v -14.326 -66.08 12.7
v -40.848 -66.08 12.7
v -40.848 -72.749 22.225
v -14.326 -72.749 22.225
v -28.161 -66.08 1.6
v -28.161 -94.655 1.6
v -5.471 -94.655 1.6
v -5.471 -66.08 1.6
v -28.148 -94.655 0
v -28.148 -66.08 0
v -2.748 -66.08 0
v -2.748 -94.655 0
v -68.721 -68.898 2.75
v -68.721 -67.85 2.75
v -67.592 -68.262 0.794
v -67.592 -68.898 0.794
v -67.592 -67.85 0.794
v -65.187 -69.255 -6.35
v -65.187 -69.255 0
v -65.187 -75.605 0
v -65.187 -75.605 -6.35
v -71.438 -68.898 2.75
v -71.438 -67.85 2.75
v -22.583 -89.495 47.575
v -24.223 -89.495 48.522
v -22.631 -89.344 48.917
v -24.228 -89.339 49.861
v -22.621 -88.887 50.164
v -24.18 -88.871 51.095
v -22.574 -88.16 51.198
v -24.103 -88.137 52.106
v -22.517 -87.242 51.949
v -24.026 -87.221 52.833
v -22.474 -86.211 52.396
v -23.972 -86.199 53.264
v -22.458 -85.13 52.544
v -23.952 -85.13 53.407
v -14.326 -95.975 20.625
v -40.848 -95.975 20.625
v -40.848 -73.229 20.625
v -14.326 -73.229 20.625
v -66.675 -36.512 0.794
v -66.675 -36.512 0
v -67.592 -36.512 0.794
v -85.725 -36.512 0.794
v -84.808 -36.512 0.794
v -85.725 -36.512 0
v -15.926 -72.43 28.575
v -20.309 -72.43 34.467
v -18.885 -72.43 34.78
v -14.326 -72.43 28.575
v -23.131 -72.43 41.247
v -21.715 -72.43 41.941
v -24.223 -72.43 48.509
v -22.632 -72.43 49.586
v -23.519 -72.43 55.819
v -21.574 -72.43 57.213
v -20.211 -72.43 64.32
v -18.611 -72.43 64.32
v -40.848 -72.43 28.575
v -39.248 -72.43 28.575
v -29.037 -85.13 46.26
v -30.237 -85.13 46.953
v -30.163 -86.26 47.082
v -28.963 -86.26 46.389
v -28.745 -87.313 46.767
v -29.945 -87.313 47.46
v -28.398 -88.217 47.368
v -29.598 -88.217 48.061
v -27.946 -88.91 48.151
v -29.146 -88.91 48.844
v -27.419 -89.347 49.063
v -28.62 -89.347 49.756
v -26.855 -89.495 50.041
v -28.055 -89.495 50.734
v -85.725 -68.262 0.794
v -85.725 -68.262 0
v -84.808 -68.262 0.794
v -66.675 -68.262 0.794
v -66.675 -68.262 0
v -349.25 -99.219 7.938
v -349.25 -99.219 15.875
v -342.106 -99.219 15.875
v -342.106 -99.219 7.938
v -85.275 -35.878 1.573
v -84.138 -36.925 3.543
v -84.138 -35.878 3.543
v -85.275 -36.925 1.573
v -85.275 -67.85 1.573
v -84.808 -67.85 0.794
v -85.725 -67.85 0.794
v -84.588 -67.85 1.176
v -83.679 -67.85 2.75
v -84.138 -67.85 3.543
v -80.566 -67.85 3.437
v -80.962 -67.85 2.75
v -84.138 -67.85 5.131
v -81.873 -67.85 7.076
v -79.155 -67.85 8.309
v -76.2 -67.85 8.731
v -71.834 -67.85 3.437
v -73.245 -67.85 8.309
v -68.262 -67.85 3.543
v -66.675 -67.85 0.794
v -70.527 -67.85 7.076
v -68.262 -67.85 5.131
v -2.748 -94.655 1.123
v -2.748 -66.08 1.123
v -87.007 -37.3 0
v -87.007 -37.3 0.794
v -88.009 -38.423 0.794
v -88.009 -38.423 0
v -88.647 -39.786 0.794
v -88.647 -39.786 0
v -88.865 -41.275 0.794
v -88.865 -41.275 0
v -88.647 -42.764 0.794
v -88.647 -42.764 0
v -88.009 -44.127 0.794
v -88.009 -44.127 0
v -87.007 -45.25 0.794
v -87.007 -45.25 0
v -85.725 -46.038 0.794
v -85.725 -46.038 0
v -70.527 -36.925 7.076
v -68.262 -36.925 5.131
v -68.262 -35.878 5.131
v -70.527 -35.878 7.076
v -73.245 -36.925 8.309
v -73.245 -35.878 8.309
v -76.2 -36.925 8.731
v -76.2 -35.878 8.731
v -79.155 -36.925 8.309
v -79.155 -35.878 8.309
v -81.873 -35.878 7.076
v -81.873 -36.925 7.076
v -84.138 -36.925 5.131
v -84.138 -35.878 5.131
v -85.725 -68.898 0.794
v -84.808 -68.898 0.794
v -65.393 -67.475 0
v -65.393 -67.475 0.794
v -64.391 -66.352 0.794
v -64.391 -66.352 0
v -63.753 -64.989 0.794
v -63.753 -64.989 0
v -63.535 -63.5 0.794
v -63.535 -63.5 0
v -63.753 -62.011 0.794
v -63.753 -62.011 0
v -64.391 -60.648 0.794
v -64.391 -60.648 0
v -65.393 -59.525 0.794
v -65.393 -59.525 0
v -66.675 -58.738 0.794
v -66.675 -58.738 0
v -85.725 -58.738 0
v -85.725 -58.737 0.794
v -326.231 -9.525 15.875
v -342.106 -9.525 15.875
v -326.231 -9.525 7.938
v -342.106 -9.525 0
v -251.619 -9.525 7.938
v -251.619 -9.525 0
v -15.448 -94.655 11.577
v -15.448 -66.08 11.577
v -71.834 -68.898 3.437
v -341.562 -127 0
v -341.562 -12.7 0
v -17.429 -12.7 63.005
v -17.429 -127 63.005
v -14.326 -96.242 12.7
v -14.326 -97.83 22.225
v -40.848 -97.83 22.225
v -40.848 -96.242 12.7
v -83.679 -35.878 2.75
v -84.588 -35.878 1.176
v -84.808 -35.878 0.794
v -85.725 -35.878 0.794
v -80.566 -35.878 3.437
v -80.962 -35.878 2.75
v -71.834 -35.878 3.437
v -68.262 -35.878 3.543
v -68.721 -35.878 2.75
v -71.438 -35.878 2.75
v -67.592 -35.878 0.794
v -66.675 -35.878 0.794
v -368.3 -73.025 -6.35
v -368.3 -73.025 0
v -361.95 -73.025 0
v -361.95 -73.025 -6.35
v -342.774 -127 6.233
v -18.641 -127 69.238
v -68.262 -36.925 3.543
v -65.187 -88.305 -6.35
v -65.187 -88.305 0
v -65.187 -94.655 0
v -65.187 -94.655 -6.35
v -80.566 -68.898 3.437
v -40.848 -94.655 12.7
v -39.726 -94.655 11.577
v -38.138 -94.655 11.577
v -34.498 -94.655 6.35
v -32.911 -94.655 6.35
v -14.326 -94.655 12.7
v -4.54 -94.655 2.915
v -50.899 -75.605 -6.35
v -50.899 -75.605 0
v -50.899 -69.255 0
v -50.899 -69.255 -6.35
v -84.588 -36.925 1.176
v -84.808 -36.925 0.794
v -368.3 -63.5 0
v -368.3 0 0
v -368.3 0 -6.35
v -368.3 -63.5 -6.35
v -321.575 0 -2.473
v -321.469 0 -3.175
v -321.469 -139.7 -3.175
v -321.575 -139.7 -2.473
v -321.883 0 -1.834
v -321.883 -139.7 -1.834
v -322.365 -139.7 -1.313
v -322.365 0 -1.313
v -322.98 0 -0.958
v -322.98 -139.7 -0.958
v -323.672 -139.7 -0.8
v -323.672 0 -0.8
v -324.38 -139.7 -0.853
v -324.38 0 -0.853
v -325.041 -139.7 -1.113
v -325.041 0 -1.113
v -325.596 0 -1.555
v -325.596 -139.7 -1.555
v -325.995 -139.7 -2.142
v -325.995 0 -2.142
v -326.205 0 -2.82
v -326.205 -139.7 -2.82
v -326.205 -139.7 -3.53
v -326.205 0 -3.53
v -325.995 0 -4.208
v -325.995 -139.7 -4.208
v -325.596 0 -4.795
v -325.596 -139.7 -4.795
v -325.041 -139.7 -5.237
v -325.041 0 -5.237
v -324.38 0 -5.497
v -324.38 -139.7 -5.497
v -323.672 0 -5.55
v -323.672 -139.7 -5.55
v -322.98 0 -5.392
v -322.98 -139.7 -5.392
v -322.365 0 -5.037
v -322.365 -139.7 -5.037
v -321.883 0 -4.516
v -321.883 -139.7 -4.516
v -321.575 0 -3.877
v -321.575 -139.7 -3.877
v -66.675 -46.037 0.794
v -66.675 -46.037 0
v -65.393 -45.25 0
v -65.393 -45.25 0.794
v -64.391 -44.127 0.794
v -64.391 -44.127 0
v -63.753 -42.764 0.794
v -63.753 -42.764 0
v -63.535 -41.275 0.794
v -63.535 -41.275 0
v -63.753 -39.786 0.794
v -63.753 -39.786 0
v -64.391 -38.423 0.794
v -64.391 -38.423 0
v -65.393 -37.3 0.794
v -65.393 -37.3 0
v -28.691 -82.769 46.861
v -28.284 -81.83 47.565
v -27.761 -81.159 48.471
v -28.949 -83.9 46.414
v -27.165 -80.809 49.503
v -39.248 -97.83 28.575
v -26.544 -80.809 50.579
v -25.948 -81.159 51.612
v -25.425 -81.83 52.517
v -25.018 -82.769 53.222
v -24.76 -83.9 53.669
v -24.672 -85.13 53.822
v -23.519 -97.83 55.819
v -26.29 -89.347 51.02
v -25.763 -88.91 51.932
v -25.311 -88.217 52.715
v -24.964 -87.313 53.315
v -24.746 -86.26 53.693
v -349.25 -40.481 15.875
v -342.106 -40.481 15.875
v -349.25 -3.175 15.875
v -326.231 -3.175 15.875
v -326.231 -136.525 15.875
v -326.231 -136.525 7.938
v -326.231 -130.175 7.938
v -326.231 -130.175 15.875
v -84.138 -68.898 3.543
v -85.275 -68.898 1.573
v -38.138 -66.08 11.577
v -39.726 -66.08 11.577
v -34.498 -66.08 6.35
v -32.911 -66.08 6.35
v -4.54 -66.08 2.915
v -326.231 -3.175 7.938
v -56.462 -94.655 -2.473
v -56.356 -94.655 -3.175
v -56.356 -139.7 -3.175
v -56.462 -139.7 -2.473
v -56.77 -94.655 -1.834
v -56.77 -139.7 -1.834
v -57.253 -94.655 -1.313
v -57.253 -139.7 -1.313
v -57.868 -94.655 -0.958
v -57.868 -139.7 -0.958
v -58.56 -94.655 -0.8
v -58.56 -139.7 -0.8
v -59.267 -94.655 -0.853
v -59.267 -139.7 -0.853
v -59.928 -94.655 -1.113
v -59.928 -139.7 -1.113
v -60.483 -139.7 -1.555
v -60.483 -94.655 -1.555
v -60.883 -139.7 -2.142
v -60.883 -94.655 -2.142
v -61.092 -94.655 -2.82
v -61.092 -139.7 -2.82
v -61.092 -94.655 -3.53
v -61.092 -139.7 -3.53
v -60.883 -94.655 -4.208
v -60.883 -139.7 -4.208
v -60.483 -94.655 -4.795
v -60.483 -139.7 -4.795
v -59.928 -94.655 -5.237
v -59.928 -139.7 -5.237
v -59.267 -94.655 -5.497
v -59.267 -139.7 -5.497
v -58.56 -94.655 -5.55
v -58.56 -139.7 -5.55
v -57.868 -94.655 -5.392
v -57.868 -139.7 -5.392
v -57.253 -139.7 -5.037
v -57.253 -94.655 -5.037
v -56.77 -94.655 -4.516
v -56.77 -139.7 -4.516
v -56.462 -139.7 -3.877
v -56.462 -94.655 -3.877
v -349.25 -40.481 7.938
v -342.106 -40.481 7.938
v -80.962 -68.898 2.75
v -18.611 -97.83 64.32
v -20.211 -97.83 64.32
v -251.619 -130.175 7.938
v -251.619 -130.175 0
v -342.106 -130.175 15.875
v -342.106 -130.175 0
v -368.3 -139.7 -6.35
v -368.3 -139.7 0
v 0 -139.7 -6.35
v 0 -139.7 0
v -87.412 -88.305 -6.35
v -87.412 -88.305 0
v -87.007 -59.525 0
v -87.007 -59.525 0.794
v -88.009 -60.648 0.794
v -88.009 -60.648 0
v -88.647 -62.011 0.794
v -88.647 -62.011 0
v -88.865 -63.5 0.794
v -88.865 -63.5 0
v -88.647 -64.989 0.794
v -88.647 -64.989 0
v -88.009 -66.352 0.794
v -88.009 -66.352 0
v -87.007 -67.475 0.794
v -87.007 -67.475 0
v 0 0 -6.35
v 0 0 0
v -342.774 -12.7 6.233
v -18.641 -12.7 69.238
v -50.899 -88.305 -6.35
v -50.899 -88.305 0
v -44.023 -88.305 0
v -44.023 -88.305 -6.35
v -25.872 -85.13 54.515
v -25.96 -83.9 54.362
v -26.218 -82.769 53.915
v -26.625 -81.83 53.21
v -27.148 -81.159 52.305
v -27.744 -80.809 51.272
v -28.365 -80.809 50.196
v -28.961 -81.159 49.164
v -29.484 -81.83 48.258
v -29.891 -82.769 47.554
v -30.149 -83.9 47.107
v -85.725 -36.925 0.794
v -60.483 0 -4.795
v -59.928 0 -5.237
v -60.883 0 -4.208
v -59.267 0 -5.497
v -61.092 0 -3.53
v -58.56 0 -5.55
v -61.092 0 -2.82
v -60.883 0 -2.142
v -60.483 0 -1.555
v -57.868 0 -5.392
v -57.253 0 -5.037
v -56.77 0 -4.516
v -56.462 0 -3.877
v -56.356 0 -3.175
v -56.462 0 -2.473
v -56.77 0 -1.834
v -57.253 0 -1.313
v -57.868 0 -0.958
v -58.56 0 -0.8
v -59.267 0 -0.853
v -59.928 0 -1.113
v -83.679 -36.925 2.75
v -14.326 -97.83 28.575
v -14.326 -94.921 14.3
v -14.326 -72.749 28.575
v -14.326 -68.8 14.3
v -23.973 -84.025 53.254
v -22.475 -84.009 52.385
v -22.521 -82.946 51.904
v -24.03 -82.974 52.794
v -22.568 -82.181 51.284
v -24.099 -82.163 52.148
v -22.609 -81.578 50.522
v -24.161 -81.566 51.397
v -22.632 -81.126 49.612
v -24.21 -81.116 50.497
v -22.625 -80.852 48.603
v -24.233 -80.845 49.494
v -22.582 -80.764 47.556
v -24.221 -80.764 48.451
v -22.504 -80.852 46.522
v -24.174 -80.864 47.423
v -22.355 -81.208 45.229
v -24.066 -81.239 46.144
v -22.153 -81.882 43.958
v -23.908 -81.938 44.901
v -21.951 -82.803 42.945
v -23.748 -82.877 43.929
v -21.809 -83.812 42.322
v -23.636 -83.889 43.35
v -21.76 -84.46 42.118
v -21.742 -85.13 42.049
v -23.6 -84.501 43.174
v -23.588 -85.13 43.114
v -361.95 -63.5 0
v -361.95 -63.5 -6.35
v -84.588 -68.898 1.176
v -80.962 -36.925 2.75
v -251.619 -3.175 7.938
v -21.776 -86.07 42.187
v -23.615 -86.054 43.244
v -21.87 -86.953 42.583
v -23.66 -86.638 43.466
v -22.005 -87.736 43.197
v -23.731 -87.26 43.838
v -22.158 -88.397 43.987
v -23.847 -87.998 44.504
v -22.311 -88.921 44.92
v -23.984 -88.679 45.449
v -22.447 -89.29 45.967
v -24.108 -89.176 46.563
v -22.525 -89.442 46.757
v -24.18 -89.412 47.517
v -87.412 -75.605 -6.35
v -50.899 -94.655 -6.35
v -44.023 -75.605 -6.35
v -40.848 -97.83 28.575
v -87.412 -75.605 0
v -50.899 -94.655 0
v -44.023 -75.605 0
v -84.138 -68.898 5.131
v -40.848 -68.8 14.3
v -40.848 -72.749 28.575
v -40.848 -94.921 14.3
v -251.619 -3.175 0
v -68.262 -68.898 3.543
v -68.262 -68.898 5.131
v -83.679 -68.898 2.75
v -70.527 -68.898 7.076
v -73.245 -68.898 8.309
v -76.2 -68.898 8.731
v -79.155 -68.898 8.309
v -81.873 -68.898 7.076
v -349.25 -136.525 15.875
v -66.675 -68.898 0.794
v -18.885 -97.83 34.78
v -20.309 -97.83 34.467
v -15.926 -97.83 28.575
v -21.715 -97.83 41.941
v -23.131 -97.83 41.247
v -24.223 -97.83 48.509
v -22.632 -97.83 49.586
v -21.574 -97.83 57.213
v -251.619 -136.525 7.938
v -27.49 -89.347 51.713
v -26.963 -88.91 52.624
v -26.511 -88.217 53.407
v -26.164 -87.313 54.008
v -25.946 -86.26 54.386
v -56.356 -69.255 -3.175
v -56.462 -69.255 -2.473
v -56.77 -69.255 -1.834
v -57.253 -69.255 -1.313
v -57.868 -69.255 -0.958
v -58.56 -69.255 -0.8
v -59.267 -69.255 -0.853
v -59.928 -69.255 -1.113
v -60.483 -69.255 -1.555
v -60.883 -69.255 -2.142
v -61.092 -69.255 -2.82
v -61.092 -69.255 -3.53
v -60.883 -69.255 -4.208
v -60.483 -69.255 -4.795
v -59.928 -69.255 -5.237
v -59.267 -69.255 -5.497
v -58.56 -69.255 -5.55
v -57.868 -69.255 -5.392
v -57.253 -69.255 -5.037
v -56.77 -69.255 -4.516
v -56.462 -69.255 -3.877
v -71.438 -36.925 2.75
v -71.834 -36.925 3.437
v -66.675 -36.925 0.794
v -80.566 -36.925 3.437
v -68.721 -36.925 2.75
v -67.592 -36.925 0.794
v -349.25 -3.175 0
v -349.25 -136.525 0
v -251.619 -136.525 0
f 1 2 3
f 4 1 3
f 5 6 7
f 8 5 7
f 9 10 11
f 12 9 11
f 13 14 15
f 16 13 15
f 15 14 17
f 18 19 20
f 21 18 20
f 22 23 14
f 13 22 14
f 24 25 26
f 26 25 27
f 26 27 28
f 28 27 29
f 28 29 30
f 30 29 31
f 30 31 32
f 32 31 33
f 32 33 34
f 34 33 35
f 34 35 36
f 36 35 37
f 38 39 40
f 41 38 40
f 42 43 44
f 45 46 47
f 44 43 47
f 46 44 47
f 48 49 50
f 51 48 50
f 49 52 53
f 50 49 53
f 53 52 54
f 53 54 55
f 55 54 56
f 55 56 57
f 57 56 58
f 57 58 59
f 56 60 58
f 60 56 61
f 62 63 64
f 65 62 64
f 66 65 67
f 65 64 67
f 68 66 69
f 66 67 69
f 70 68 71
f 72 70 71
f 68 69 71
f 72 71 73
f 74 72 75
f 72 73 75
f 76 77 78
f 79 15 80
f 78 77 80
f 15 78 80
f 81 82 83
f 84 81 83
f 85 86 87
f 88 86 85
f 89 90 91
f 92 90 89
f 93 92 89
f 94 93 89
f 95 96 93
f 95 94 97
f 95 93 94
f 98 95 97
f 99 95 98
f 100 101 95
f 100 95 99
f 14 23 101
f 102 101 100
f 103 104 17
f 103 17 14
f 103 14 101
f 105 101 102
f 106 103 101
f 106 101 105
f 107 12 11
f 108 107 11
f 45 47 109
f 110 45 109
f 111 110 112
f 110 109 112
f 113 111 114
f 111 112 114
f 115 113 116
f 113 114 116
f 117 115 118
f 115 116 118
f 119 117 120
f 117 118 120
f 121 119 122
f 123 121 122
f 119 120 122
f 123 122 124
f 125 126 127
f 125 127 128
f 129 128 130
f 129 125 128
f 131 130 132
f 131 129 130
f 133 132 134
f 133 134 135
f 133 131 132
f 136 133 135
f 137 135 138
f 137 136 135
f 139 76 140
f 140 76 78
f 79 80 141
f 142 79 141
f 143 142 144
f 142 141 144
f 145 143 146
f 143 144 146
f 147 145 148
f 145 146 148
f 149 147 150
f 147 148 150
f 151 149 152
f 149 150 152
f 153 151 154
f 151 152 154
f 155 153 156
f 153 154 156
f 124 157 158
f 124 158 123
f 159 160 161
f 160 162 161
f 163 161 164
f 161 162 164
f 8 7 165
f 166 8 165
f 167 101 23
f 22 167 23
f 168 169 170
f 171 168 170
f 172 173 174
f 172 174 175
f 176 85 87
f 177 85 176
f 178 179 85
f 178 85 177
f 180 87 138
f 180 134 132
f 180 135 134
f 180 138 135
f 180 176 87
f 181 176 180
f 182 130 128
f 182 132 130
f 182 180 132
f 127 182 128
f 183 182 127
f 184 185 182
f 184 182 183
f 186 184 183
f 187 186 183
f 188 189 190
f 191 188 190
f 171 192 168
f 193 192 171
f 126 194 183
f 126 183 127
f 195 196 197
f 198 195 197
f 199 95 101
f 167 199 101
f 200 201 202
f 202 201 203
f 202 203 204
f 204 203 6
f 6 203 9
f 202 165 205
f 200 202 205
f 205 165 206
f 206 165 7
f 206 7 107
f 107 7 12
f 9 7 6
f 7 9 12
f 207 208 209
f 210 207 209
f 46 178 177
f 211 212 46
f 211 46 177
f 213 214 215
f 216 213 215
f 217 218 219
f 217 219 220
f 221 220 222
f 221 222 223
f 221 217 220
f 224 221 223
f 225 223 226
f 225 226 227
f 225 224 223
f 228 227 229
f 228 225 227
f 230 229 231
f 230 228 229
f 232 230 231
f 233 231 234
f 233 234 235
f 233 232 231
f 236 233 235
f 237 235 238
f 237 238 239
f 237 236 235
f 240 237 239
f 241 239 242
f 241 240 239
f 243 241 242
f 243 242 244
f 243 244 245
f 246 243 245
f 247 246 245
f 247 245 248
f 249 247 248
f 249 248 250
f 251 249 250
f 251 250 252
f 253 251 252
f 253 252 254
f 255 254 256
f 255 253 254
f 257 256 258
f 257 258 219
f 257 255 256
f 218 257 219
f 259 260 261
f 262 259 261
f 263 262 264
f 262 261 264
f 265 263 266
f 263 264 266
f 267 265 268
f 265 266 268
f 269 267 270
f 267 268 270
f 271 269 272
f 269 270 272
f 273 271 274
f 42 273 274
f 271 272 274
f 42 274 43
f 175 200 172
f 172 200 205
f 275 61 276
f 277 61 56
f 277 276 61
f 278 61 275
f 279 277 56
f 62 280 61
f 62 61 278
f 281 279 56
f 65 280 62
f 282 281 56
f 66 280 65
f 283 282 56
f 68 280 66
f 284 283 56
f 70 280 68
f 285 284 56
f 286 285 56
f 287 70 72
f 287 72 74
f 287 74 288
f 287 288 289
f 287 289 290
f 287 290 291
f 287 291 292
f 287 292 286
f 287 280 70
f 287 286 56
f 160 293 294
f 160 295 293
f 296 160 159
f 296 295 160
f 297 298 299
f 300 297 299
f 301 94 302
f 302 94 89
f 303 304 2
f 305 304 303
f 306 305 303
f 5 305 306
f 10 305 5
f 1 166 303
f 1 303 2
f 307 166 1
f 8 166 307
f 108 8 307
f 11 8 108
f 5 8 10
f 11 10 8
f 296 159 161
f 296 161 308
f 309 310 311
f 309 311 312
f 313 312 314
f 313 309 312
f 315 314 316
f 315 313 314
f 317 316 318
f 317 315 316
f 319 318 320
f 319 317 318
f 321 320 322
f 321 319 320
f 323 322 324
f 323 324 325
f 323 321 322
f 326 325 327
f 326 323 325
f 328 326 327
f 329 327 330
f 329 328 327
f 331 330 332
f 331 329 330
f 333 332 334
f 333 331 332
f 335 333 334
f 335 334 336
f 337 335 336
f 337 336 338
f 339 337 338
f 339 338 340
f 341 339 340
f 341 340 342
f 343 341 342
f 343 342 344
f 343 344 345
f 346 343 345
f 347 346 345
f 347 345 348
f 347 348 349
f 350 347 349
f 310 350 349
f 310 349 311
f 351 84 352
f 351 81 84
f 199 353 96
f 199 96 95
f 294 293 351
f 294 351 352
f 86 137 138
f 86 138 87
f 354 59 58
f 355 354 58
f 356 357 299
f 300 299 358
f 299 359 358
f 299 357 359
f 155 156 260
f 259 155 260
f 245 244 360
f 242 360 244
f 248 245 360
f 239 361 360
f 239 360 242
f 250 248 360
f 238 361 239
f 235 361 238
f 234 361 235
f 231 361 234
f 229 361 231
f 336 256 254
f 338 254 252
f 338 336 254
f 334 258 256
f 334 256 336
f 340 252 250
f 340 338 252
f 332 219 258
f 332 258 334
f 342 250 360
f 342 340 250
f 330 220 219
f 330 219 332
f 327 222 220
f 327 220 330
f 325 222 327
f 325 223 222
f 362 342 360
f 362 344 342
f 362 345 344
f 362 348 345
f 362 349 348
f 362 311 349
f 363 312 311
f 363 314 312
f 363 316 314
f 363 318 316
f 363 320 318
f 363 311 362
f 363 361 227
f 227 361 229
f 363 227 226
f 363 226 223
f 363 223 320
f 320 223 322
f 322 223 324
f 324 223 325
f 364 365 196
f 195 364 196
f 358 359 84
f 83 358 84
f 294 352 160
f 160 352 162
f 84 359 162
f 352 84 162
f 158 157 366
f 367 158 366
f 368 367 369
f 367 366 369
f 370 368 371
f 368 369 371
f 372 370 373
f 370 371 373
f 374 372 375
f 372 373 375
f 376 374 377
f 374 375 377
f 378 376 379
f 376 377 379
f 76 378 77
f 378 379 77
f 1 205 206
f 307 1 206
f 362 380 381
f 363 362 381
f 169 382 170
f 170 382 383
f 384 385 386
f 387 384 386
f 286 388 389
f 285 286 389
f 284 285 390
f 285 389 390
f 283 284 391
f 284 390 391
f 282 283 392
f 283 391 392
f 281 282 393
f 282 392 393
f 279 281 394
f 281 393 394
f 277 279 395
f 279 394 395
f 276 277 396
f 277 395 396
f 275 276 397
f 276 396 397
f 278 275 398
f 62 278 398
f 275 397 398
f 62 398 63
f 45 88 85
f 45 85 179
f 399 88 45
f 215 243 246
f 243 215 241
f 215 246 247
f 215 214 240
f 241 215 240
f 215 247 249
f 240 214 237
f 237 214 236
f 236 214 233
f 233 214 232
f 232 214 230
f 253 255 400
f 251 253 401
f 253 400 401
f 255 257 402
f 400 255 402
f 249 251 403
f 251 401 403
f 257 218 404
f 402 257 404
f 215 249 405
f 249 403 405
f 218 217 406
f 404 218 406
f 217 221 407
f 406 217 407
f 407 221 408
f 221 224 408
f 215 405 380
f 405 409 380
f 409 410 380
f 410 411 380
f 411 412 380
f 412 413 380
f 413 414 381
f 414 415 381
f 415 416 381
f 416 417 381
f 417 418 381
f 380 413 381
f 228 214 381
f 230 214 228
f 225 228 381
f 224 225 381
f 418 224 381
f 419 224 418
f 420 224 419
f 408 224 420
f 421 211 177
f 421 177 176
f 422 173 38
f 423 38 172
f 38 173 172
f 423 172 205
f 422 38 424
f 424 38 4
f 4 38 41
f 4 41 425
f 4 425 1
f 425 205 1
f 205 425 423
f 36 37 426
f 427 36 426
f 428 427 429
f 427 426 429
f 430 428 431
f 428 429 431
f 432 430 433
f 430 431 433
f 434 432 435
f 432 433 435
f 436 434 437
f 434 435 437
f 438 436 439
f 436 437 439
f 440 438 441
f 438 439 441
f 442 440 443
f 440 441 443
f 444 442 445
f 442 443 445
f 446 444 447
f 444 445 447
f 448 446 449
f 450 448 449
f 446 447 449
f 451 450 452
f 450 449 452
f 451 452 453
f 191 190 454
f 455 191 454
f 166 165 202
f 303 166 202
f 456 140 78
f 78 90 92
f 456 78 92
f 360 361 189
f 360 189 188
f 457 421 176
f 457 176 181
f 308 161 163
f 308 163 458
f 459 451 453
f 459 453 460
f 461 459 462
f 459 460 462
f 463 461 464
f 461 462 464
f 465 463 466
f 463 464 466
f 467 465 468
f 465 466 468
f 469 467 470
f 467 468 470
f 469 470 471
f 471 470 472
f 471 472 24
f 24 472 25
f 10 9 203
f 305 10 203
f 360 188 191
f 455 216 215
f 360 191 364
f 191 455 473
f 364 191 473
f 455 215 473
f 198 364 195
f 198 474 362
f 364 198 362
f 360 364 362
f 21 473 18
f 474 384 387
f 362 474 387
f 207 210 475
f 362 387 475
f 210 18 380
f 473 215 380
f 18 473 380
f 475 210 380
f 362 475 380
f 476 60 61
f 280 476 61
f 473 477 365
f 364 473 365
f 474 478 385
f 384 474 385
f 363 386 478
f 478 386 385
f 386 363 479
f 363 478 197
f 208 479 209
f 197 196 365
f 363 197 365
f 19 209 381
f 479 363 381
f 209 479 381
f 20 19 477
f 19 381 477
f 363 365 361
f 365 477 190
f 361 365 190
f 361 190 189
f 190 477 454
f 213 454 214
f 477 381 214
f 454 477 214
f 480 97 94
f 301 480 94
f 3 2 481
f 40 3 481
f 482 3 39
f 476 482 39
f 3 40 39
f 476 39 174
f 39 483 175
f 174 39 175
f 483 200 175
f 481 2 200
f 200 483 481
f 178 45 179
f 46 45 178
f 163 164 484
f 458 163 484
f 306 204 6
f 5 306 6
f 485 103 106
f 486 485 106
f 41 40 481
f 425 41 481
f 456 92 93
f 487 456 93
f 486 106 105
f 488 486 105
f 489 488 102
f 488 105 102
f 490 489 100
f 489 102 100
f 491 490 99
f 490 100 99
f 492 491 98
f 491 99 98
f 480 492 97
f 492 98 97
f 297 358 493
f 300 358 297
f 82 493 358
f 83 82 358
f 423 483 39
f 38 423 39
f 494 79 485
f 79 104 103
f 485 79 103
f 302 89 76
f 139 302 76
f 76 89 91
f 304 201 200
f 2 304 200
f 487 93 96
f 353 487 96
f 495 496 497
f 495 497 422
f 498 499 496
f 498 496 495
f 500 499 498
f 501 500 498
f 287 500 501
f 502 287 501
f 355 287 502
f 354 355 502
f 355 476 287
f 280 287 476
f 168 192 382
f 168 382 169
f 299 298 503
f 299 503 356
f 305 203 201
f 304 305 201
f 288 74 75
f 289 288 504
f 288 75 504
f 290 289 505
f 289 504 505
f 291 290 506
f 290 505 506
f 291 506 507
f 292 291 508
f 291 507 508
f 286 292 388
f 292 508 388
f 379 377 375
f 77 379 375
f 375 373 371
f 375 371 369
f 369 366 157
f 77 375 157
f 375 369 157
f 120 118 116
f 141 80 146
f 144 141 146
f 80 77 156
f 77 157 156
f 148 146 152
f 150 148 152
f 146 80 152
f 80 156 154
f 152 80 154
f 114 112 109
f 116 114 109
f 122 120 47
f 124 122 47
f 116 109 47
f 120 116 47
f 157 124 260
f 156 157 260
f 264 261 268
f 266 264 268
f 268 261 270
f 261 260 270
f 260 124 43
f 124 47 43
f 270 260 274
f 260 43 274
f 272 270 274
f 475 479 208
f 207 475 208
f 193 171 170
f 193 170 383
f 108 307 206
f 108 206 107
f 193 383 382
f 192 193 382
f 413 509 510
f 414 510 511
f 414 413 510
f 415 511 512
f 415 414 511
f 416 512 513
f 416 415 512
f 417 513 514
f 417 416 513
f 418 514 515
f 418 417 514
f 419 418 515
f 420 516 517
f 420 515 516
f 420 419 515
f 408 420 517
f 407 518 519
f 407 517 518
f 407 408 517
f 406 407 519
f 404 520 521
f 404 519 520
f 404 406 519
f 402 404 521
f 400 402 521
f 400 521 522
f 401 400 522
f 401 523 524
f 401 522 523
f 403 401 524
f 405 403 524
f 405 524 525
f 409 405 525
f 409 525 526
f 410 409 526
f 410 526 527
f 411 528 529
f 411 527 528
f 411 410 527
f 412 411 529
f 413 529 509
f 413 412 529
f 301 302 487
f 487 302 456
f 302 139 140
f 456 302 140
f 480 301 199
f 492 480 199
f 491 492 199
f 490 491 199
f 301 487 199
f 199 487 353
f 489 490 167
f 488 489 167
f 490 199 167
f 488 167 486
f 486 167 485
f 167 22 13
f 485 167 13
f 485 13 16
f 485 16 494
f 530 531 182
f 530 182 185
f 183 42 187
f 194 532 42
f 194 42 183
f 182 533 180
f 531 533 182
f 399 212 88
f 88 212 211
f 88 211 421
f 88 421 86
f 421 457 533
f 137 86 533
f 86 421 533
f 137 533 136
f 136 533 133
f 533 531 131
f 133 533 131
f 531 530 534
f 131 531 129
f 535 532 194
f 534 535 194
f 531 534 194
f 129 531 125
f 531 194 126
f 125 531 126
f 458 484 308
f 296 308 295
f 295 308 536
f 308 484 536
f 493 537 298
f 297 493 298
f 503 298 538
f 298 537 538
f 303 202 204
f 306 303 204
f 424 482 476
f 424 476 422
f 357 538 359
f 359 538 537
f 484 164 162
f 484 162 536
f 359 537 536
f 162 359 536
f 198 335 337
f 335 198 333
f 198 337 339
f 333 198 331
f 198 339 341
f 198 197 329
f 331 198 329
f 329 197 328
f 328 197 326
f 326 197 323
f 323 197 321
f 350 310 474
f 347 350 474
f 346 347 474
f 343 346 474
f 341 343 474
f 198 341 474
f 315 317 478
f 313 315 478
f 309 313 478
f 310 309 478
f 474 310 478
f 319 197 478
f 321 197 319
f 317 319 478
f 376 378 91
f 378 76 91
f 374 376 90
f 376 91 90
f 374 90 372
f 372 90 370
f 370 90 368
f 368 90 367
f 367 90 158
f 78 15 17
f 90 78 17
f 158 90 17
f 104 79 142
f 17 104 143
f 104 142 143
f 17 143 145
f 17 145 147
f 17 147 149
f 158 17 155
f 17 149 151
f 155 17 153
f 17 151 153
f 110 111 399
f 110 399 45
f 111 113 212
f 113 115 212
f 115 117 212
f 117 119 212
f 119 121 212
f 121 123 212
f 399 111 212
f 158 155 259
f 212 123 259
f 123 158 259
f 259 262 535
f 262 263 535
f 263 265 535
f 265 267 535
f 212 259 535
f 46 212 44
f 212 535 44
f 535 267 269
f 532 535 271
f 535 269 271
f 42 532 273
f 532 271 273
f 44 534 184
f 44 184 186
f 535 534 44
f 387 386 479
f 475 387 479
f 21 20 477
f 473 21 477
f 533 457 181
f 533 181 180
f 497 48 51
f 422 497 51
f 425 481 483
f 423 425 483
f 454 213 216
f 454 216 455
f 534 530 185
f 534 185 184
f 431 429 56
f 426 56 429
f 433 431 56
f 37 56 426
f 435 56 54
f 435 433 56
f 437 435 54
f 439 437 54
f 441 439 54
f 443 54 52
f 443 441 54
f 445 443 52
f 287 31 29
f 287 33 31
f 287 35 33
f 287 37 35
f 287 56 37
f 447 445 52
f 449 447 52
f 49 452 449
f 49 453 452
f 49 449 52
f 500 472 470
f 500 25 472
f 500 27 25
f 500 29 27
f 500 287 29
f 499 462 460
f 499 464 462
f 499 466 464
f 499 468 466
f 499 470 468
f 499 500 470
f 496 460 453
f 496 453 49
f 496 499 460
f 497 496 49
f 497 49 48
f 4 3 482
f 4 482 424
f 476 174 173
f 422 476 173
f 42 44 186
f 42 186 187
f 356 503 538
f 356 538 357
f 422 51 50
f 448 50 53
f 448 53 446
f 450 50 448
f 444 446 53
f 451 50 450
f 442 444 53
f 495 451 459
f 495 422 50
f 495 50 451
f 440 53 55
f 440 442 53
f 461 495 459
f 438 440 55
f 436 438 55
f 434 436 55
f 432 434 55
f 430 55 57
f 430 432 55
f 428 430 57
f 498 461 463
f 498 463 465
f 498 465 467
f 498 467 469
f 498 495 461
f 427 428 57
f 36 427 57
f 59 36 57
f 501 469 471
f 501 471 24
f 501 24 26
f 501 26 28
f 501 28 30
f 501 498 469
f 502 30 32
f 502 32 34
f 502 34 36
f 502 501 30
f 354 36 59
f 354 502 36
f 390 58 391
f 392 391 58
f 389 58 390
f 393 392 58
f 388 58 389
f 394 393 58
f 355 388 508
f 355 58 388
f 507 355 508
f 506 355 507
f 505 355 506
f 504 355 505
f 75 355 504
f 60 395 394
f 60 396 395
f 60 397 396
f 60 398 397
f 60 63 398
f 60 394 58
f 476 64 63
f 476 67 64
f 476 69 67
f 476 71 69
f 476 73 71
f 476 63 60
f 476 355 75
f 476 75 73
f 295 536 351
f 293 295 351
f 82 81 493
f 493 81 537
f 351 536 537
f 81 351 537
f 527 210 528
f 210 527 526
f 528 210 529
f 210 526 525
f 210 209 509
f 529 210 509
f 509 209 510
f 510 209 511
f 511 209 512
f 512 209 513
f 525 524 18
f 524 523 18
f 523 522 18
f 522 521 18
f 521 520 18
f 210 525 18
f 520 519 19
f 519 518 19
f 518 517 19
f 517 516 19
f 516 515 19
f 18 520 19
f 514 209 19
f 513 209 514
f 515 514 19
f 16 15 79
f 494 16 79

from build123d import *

# Parameters (mm, degrees)
F0_R      = 2.38125
F1_DEPTH  = 139.7
F2_W      = 6.35
F2_H      = 9.525
F3_DEPTH  = 25.4
F2_W_2    = 12.7
F2_H_2    = 31.75
F4_DEPTH  = 0.79375
F5_W      = 19.05
F5_H      = 12.7
F6_DEPTH  = 7.9375
F8_DEPTH  = 44.45
F9_W      = 11.1125
F9_H      = 9.3597000718
F10_DEPTH = 22.352
F11_DEPTH = 10.16
F12_DEPTH = 10.16
F13_DEPTH = 9.906
F14_DEPTH = 9.906
F15_DEPTH = 6.35
F2_W_3    = 38.1
F2_H_3    = 22.225
F2_H_4    = 6.35
F16_DEPTH = 12.7
F18_DEPTH = 30.48
F19_W     = 26.5225320151
F19_H     = 3.175
F19_H_2   = 28.575
F20_DEPTH = 9.525
F22_DEPTH = 31.75
F23_DEPTH = 6.35
F25_DEPTH = 25.4
F28_DEPTH = 25.4
F29_DEPTH = 127
F30_DEPTH = 12.7
F2_W_4    = 7.14375
F2_H_5    = 133.35
F31_DEPTH = 7.9375
F32_W     = 6.35
F32_H     = 7.9375
F33_DEPTH = 90.4875
F34_W     = 7.14375
F34_H     = 30.95625
F35_DEPTH = 7.9375


with BuildPart() as f1:
    # F0 (on Front) → F1 (new body)
    with BuildSketch(Plane.XZ):
        Polygon((0, -6.35), (0, 0), (-341.5624201298, 0), (-368.3, 0), (-368.3, -6.35), align=None)
        with Locations((-323.85, -3.175)):
            Circle(F0_R, mode=Mode.SUBTRACT)
        with Locations((-58.7375, -3.175)):
            Circle(F0_R, mode=Mode.SUBTRACT)
    extrude(amount=F1_DEPTH)

    # F2 (on face) → F3 (cut)
    with BuildSketch(Plane.XY):
        with Locations((-365.125, -68.2625)):
            Rectangle(F2_W, F2_H)
    extrude(amount=-F3_DEPTH, mode=Mode.SUBTRACT)

    # F2 (on face) → F15 (cut)
    with BuildSketch(Plane.XY):
        Polygon((-87.41171875, -75.6046875), (-87.41171875, -88.3046875), (-65.18671875, -88.3046875), (-65.18671875, -94.6546875), (-50.89921875, -94.6546875), (-50.89921875, -88.3046875), (-44.0232381225, -88.3046875), (-44.0232381225, -75.6046875), (-50.89921875, -75.6046875), (-50.89921875, -69.2546875), (-65.18671875, -69.2546875), (-65.18671875, -75.6046875), align=None)
    extrude(amount=-F15_DEPTH, mode=Mode.SUBTRACT)


with BuildPart() as f4:
    # F2 (on face) → F4 (new body)
    with BuildSketch(Plane.XY):
        with BuildLine():
            Line((-82.55, -36.5125), (-85.725, -36.5125))
            ThreePointArc((-85.725, -36.5125), (-88.8651367233, -41.275), (-85.725, -46.0375))
            Line((-85.725, -46.0375), (-85.725, -58.7375))
            ThreePointArc((-85.725, -58.7375), (-88.8651367233, -63.5), (-85.725, -68.2625))
            Line((-85.725, -68.2625), (-82.55, -68.2625))
            Line((-82.55, -68.2625), (-82.55, -36.5125))
        make_face()
        with Locations((-76.2, -52.3875)):
            Rectangle(F2_W_2, F2_H_2)
        with BuildLine():
            Line((-66.675, -36.5125), (-69.85, -36.5125))
            Line((-69.85, -36.5125), (-69.85, -68.2625))
            Line((-69.85, -68.2625), (-66.675, -68.2625))
            ThreePointArc((-66.675, -68.2625), (-63.5348632767, -63.5), (-66.675, -58.7375))
            Line((-66.675, -58.7375), (-66.675, -46.0375))
            ThreePointArc((-66.675, -46.0375), (-63.5348632767, -41.275), (-66.675, -36.5125))
        make_face()
    extrude(amount=F4_DEPTH)

    # F5 (on face) → F6 (join)
    with BuildSketch(Plane.XY.offset(0.79375)):
        with Locations((-76.2, -52.3875)):
            Rectangle(F5_W, F5_H)
    extrude(amount=F6_DEPTH)

    # F7 (on face) → F8 (cut)
    with BuildSketch(Plane(origin=(0, -46.0375, 0), x_dir=(-1, 0, 0), z_dir=(0, 1, 0))):
        with BuildLine():
            Line((76.2, 8.73125), (66.675, 8.73125))
            Line((66.675, 8.73125), (66.675, 0.79375))
            Line((66.675, 0.79375), (68.2625, 3.543380657))
            Line((68.2625, 3.543380657), (68.2625, 5.130880657))
            ThreePointArc((68.2625, 5.130880657), (71.8420599575, 7.789087289), (76.2, 8.73125))
        make_face()
        with BuildLine():
            Line((85.725, 8.73125), (76.2, 8.73125))
            ThreePointArc((76.2, 8.73125), (80.5579400425, 7.789087289), (84.1375, 5.130880657))
            Line((84.1375, 5.130880657), (84.1375, 3.543380657))
            Line((84.1375, 3.543380657), (85.2749538321, 1.5732528285))
            Line((85.2749538321, 1.5732528285), (85.725, 0.79375))
            Line((85.725, 0.79375), (85.725, 8.73125))
        make_face()
        Polygon((80.565625, 3.4370383213), (76.2, 3.4370383213), (76.2, 0.79375), (84.8084564477, 0.79375), (84.5875461679, 1.1763778285), (83.6792282238, 2.749630657), (80.9625, 2.749630657), align=None)
        Polygon((76.2, 0.79375), (76.2, 3.4370383213), (71.834375, 3.4370383213), (71.4375, 2.749630657), (68.7207717762, 2.749630657), (67.5915435523, 0.79375), align=None)
    extrude(amount=-F8_DEPTH, mode=Mode.SUBTRACT)

    # F9 (on face) → F10 (cut)
    with BuildSketch(Plane.YZ.offset(-66.675)):
        with Locations((-52.3875, 5.4736000359)):
            Rectangle(F9_W, F9_H)
    extrude(amount=-F10_DEPTH, mode=Mode.SUBTRACT)

    # F11 (add): a face of the model
    f11_faces = [f4.faces().sort_by_distance(p)[0] for p in [
        (-76.2, -58.7375, 5.3038676358),
    ]]
    extrude(f11_faces, amount=F11_DEPTH)

    # F12 (add): a face of the model
    f12_faces = [f4.faces().sort_by_distance(p)[0] for p in [
        (-76.2, -46.0375, 5.3038676358),
    ]]
    extrude(f12_faces, amount=F12_DEPTH)

    # F13 (cut): a face of the model
    f13_faces = [f4.faces().sort_by_distance(p)[0] for p in [
        (-76.2, -46.83125, 5.3038676358),
    ]]
    extrude(f13_faces, amount=-F13_DEPTH, mode=Mode.SUBTRACT)

    # F14 (cut): a face of the model
    f14_faces = [f4.faces().sort_by_distance(p)[0] for p in [
        (-76.2, -57.94375, 5.3038676358),
    ]]
    extrude(f14_faces, amount=-F14_DEPTH, mode=Mode.SUBTRACT)


with BuildPart() as f16:
    # F2 (on face) → F16 (new body)
    with BuildSketch(Plane.XY):
        with Locations((-21.7982381225, -77.1921875)):
            Rectangle(F2_W_3, F2_H_3)
        with Locations((-21.7982381225, -91.4796875)):
            Rectangle(F2_W_3, F2_H_4)
    extrude(amount=F16_DEPTH)

    # F17 (on face) → F18 (cut)
    with BuildSketch(Plane.XZ.offset(94.6546875)):
        Polygon((-5.4709701376, 1.6002), (-5.6628659544, 1.7920958168), (-15.4482381225, 11.5774679849), (-38.1382061073, 11.5774679849), (-32.9107381225, 6.35), (-28.1609381225, 1.6002), (-18.4952411801, 1.6002), align=None)
        Polygon((-4.5403339392, 2.9146278319), (-2.7482381225, 1.1225320151), (-2.7482381225, 12.7), (-14.3257061073, 12.7), align=None)
        Polygon((-39.7257061073, 11.5774679849), (-40.8482381225, 12.7), (-40.8482381225, 0), (-28.1482381225, 0), (-34.4982381225, 6.35), align=None)
    extrude(amount=-F18_DEPTH, mode=Mode.SUBTRACT)

    # F19 (on face) → F20 (join)
    with BuildSketch(Plane.XY.offset(12.7)):
        with Locations((-27.5869721149, -96.2421875)):
            Rectangle(F19_W, F19_H)
        with Locations((-27.5869721149, -80.3671875)):
            Rectangle(F19_W, F19_H_2)
    extrude(amount=F20_DEPTH)

    # F21 (on face) → F22 (cut)
    with BuildSketch(Plane(origin=(-40.8482381225, 0, 0), x_dir=(0, -1, 0), z_dir=(-1, 0, 0))):
        Polygon((94.9213875, 14.3002), (95.9754875, 20.6248), (74.3493643014, 20.6248), (73.2288921988, 20.6248), (68.8003596026, 14.3002), (94.6546875, 14.3002), align=None)
        Polygon((66.0796875, 12.7), (72.7491643014, 22.225), (66.0796875, 22.225), (66.0796875, 17.4625), align=None)
        Polygon((97.8296875, 12.7), (97.8296875, 22.225), (96.2421875, 12.7), align=None)
    extrude(amount=-F22_DEPTH, mode=Mode.SUBTRACT)

    # F23 (add): a face of the model
    f23_faces = [f16.faces().sort_by_distance(p)[0] for p in [
        (-27.5869721149, -85.2894259007, 22.225),
    ]]
    extrude(f23_faces, amount=F23_DEPTH)


with BuildPart() as f25:
    # F24 (on face) → F25 (new body)
    with BuildSketch(Plane.XZ.offset(97.8296875)):
        with BuildLine():
            Line((-20.2107381225, 64.3201985412), (-40.8482381225, 28.575))
            Line((-40.8482381225, 28.575), (-39.2480381225, 28.575))
            Line((-39.2480381225, 28.575), (-23.5188438749, 55.8187635989))
            ThreePointArc((-23.5188438749, 55.8187635989), (-22.1895462685, 60.1958508869), (-20.2107381225, 64.3201985412))
        make_face()
        with BuildLine():
            Line((-18.6105381225, 64.3201985412), (-20.2107381225, 64.3201985412))
            ThreePointArc((-20.2107381225, 64.3201985412), (-22.1895462685, 60.1958508869), (-23.5188438749, 55.8187635989))
            Line((-23.5188438749, 55.8187635989), (-18.6105381225, 64.3201985412))
        make_face()
        with BuildLine():
            ThreePointArc((-23.5188438749, 55.8187635989), (-23.131028165, 41.2468775416), (-15.9259061073, 28.575))
            Line((-15.9259061073, 28.575), (-14.3257061073, 28.575))
            ThreePointArc((-14.3257061073, 28.575), (-22.4196978205, 45.7341747223), (-18.6105381225, 64.3201985412))
            Line((-18.6105381225, 64.3201985412), (-23.5188438749, 55.8187635989))
        make_face()
    extrude(amount=-F25_DEPTH)

    # F27 (on offset) → F28 (cut)
    with BuildSketch(Plane(origin=(-43.0095165484, 0, 24.8315559569), x_dir=(0, -1, 0), z_dir=(-0.8660254038, 0, 0.5))):
        with BuildLine():
            Line((85.1297016859, 34.2753071345), (85.1297016859, 25.5440571345))
            ThreePointArc((85.1297016859, 25.5440571345), (88.2166647275, 26.8227190929), (89.4953266859, 29.9096821345))
            ThreePointArc((89.4953266859, 29.9096821345), (88.2166647275, 32.9966451762), (85.1297016859, 34.2753071345))
        make_face()
        with BuildLine():
            ThreePointArc((85.1297016859, 34.2753071345), (80.7640766859, 29.9096821345), (85.1297016859, 25.5440571345))
            Line((85.1297016859, 25.5440571345), (85.1297016859, 34.2753071345))
        make_face()
    extrude(amount=-F28_DEPTH, mode=Mode.SUBTRACT)


with BuildPart() as f29:
    # F0 (on Front) → F29 (new body)
    with BuildSketch(Plane.XZ):
        Polygon((-342.7740572504, 6.2333326149), (-341.5624201298, 0), (-17.4291241554, 63.0051302733), (-18.640761276, 69.2384628882), align=None)
    extrude(amount=F29_DEPTH)

    # F30 (cut): a face of the model
    f30_faces = [f29.faces().sort_by_distance(p)[0] for p in [
        (-180.1015907029, 0, 34.6192314441),
    ]]
    extrude(f30_faces, amount=-F30_DEPTH, mode=Mode.SUBTRACT)


with BuildPart() as f31:
    # F2 (on face) → F31 (new body)
    with BuildSketch(Plane.XY):
        with Locations((-345.678125, -69.85)):
            Rectangle(F2_W_4, F2_H_5)
    extrude(amount=F31_DEPTH)

    # F32 (on face) → F33 (join)
    with BuildSketch(Plane.YZ.offset(-342.10625)):
        with Locations((-6.35, 3.96875)):
            Rectangle(F32_W, F32_H)
        with Locations((-133.35, 3.96875)):
            Rectangle(F32_W, F32_H)
    extrude(amount=F33_DEPTH)

    # F34 (on face) → F35 (join)
    with BuildSketch(Plane.XY.offset(7.9375)):
        with Locations((-345.678125, -25.003125)):
            Rectangle(F34_W, F34_H)
        Polygon((-326.23125, -3.175), (-349.25, -3.175), (-349.25, -9.525), (-342.10625, -9.525), (-326.23125, -9.525), align=None)
        with Locations((-345.678125, -114.696875)):
            Rectangle(F34_W, F34_H)
        Polygon((-342.10625, -130.175), (-349.25, -130.175), (-349.25, -136.525), (-326.23125, -136.525), (-326.23125, -130.175), align=None)
    extrude(amount=F35_DEPTH)


solid = Compound([f1.part, f4.part, f16.part, f25.part, f29.part, f31.part])
